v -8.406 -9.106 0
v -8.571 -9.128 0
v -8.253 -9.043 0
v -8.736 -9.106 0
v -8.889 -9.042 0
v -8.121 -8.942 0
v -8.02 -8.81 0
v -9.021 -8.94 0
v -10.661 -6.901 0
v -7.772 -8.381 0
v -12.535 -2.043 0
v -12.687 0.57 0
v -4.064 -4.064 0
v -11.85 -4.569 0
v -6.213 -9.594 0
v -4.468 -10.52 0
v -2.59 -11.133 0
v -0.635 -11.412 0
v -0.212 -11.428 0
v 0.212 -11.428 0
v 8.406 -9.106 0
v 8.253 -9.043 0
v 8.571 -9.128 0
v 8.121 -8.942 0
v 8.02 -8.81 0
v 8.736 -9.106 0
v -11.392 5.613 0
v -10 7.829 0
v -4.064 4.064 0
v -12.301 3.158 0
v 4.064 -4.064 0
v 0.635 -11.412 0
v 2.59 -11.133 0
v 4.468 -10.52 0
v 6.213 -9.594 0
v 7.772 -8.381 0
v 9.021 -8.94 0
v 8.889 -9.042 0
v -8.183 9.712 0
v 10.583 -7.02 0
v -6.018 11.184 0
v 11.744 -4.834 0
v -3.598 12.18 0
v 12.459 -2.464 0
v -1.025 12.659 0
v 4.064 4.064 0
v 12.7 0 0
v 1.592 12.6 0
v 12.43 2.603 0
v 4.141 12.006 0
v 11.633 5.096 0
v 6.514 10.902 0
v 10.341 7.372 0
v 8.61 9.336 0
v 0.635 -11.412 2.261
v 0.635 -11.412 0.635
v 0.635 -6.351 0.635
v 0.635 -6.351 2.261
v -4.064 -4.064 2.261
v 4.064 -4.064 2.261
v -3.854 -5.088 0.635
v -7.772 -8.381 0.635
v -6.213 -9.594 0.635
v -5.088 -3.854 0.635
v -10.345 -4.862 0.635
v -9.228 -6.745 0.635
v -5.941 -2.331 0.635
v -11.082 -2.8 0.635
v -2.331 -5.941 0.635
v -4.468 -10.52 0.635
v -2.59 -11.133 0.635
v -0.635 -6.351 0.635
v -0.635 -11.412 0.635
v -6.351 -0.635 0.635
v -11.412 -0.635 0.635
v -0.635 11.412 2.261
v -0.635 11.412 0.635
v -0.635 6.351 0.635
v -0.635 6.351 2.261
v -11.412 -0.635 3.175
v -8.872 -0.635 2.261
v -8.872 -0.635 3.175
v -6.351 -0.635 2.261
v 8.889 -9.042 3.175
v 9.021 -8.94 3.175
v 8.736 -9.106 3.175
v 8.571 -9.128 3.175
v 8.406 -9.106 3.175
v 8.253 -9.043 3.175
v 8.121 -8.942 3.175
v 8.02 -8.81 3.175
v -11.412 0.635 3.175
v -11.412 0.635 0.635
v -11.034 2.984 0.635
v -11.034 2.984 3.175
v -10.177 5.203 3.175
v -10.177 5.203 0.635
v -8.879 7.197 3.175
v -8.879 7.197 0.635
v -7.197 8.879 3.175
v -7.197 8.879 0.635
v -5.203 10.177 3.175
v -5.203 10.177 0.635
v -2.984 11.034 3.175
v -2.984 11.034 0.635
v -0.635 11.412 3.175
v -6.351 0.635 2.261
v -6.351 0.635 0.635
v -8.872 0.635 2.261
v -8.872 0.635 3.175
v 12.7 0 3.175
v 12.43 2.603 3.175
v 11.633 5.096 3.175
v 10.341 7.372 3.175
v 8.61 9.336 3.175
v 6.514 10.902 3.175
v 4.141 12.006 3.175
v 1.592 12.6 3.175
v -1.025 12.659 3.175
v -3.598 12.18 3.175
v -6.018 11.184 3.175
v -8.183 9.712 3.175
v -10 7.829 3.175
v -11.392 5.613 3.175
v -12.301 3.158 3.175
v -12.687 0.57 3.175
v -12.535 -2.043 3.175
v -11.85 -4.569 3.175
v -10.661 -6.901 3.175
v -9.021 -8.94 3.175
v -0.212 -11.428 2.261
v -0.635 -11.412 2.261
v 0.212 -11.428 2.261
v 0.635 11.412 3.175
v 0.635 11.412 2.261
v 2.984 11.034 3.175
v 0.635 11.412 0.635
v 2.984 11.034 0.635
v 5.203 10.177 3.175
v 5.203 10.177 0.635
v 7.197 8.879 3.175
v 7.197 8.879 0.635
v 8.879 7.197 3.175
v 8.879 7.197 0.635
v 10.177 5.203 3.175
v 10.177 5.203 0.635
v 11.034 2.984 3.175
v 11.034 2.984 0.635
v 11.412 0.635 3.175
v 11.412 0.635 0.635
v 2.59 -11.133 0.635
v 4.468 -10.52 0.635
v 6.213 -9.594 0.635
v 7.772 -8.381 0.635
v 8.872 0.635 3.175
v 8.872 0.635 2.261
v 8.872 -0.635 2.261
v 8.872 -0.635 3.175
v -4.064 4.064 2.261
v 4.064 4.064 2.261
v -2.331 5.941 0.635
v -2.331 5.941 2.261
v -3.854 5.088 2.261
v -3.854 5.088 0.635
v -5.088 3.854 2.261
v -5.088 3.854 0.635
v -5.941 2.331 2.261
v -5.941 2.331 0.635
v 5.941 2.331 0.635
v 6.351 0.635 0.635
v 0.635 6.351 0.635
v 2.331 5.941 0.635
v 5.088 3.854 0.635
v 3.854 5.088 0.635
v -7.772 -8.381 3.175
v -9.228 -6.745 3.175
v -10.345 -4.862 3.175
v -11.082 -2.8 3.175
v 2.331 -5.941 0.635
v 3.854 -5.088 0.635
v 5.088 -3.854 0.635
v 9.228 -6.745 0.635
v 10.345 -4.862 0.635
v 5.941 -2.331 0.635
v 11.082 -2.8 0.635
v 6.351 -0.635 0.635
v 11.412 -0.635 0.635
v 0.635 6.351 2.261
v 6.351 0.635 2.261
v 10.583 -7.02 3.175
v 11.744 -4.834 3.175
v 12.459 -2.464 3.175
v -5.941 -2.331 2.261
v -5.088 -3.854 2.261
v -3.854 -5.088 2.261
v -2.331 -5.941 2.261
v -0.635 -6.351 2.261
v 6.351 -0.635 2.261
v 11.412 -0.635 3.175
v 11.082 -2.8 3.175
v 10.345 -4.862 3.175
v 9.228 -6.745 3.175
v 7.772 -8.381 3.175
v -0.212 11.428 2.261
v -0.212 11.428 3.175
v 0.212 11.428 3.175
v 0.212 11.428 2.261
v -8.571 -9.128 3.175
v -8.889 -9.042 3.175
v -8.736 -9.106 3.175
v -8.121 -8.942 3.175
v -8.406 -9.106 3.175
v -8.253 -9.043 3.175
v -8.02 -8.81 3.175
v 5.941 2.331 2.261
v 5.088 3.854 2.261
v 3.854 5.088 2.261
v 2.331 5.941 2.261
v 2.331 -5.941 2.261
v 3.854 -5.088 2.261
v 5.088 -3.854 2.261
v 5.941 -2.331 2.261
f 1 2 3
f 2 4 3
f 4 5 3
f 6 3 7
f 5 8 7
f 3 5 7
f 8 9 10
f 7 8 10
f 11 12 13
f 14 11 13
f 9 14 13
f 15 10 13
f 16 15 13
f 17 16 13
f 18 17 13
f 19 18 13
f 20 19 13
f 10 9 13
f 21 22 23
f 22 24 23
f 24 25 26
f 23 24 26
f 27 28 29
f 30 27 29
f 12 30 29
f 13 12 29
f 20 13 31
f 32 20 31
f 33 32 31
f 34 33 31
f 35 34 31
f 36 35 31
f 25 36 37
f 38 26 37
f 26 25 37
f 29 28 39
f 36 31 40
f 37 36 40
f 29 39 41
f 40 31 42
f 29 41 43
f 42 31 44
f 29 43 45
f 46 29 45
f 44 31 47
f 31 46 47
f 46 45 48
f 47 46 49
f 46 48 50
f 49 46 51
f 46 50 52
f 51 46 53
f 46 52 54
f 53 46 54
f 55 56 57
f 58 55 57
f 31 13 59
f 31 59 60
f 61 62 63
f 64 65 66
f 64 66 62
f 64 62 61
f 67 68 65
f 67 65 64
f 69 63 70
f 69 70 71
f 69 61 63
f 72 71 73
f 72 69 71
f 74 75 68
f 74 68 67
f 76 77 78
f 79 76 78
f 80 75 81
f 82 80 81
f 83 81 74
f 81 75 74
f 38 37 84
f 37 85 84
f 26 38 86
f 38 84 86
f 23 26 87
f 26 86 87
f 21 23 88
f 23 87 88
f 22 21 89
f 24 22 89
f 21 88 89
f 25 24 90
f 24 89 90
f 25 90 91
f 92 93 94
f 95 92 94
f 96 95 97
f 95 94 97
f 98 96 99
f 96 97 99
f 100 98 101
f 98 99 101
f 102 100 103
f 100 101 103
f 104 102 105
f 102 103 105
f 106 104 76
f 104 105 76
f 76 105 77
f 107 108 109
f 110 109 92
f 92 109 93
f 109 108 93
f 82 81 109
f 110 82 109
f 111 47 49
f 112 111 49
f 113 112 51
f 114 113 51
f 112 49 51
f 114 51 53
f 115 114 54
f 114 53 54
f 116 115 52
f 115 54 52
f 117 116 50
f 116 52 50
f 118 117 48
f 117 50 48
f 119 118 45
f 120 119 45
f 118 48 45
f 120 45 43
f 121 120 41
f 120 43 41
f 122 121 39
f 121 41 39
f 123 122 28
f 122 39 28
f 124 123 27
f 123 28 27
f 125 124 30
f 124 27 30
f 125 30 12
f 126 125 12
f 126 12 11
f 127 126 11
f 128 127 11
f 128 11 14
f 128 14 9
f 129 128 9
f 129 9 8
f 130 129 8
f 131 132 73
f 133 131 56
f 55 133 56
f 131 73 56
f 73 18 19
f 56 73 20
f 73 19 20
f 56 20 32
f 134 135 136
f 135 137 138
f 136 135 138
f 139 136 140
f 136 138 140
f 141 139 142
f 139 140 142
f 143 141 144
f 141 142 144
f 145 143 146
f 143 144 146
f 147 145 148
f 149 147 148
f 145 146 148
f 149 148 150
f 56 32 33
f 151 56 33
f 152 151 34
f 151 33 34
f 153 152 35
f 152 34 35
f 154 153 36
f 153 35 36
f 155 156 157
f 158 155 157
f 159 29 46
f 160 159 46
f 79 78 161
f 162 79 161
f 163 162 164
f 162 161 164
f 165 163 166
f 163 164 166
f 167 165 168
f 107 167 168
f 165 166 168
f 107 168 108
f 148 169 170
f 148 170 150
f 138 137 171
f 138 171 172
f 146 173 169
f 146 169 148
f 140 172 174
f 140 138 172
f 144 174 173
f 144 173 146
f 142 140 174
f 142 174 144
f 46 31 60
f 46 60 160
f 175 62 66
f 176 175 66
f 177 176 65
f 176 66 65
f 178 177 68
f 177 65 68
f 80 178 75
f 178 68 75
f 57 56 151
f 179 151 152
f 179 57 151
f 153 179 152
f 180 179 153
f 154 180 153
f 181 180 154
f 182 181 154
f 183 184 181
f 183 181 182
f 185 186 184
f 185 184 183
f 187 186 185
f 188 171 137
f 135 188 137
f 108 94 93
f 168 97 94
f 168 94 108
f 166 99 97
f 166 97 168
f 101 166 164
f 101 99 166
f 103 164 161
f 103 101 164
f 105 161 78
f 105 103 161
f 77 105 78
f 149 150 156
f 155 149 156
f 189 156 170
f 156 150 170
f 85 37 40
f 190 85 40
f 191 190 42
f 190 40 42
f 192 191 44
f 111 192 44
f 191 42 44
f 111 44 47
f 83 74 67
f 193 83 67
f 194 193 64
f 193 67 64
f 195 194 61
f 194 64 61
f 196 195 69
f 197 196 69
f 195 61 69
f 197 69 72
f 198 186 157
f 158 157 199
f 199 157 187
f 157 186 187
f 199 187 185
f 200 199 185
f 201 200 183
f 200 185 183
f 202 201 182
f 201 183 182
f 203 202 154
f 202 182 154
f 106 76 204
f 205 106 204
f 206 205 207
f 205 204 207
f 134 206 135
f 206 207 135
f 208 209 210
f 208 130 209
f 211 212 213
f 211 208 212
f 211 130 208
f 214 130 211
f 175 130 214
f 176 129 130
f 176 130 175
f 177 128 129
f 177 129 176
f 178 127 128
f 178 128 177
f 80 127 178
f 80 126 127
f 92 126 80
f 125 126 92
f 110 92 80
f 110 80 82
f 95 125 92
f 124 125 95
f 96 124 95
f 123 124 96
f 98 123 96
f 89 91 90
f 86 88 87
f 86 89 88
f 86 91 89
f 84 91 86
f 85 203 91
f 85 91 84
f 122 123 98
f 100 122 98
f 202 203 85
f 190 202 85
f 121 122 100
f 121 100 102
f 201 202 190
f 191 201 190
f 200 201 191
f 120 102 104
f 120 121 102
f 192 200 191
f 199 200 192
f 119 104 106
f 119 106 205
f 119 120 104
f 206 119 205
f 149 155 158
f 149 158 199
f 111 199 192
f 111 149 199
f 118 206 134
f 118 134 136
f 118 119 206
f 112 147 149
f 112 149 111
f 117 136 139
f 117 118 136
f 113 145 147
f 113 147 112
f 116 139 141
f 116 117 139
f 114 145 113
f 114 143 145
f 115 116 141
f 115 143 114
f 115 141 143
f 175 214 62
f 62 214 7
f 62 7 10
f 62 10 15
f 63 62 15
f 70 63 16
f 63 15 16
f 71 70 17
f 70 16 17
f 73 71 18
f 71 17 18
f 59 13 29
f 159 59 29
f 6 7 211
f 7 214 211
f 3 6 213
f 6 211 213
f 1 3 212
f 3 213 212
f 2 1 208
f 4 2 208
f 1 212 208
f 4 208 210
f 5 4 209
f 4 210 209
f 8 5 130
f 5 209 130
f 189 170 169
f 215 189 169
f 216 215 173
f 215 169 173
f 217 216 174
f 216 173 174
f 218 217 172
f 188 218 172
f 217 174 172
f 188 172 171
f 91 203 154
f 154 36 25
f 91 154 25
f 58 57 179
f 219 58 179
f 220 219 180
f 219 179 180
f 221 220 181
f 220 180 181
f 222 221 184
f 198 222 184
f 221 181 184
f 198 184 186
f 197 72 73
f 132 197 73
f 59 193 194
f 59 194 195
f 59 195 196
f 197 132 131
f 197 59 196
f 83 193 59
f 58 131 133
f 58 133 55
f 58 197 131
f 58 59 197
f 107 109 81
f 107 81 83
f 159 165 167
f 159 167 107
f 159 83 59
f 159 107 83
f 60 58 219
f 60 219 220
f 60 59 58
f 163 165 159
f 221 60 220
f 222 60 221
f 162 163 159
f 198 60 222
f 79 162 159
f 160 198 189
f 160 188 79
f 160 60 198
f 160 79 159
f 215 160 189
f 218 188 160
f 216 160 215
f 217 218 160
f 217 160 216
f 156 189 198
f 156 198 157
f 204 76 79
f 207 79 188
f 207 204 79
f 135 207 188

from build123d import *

# Parameters (mm, degrees)
F0_W     = 8.128
F0_H     = 8.128
F1_DEPTH = 2.2606
F2_DEPTH = 0.635
F3_DEPTH = 3.175
F4_R     = 0.635


with BuildPart() as f1:
    # F0 (on Top) → F1 (new body)
    with BuildSketch(Plane.XY):
        with BuildLine():
            ThreePointArc((-6.3506963536, -0.635), (-4.5130128061, -4.5130128061), (-0.635, -6.3506963536))
            ThreePointArc((-0.635, -6.3506963536), (0, -6.3823639175), (0.635, -6.3506963536))
            ThreePointArc((0.635, -6.3506963536), (4.5130128061, -4.5130128061), (6.3506963536, -0.635))
            ThreePointArc((6.3506963536, -0.635), (6.3744421102, -0.3178945716), (6.3823639175, 0))
            ThreePointArc((6.3823639175, 0), (6.3744421102, 0.3178945716), (6.3506963536, 0.635))
            ThreePointArc((6.3506963536, 0.635), (4.5130128061, 4.5130128061), (0.635, 6.3506963536))
            ThreePointArc((0.635, 6.3506963536), (0, 6.3823639175), (-0.635, 6.3506963536))
            ThreePointArc((-0.635, 6.3506963536), (-4.5130128061, 4.5130128061), (-6.3506963536, 0.635))
            ThreePointArc((-6.3506963536, 0.635), (-6.3823639175, 0), (-6.3506963536, -0.635))
        make_face()
        Rectangle(F0_W, F0_H, mode=Mode.SUBTRACT)
        with BuildLine():
            Line((-0.635, -6.3506963536), (-0.635, -11.4123474798))
            ThreePointArc((-0.635, -11.4123474798), (0, -11.43), (0.635, -11.4123474798))
            Line((0.635, -11.4123474798), (0.635, -6.3506963536))
            ThreePointArc((0.635, -6.3506963536), (0, -6.3823639175), (-0.635, -6.3506963536))
        make_face()
        with BuildLine():
            ThreePointArc((0.635, 11.4123474798), (0, 11.43), (-0.635, 11.4123474798))
            Line((-0.635, 11.4123474798), (-0.635, 6.3506963536))
            ThreePointArc((-0.635, 6.3506963536), (0, 6.3823639175), (0.635, 6.3506963536))
            Line((0.635, 6.3506963536), (0.635, 11.4123474798))
        make_face()
        with BuildLine():
            Line((-8.8723474798, 0.635), (-8.8723474798, -0.635))
            Line((-8.8723474798, -0.635), (-6.3506963536, -0.635))
            ThreePointArc((-6.3506963536, -0.635), (-6.3823639175, 0), (-6.3506963536, 0.635))
            Line((-6.3506963536, 0.635), (-8.8723474798, 0.635))
        make_face()
        with BuildLine():
            Line((6.3506963536, -0.635), (8.8723474798, -0.635))
            Line((8.8723474798, -0.635), (8.8723474798, 0.635))
            Line((8.8723474798, 0.635), (6.3506963536, 0.635))
            ThreePointArc((6.3506963536, 0.635), (6.3744421102, 0.3178945716), (6.3823639175, 0))
            ThreePointArc((6.3823639175, 0), (6.3744421102, -0.3178945716), (6.3506963536, -0.635))
        make_face()
    extrude(amount=F1_DEPTH)

    # F0 (on Top) → F2 (join)
    with BuildSketch(Plane.XY):
        with BuildLine():
            ThreePointArc((-0.635, 11.4123474798), (-8.082230509, 8.082230509), (-11.4123474798, 0.635))
            Line((-11.4123474798, 0.635), (-8.8723474798, 0.635))
            Line((-8.8723474798, 0.635), (-6.3506963536, 0.635))
            ThreePointArc((-6.3506963536, 0.635), (-4.5130128061, 4.5130128061), (-0.635, 6.3506963536))
            Line((-0.635, 6.3506963536), (-0.635, 11.4123474798))
        make_face()
        with BuildLine():
            Line((8.8723474798, 0.635), (11.4123474798, 0.635))
            ThreePointArc((11.4123474798, 0.635), (8.082230509, 8.082230509), (0.635, 11.4123474798))
            Line((0.635, 11.4123474798), (0.635, 6.3506963536))
            ThreePointArc((0.635, 6.3506963536), (4.5130128061, 4.5130128061), (6.3506963536, 0.635))
            Line((6.3506963536, 0.635), (8.8723474798, 0.635))
        make_face()
        with BuildLine():
            ThreePointArc((0.635, -11.4123474798), (4.4682903074, -10.5204221269), (7.7718069116, -8.3811644375))
            ThreePointArc((7.7718069116, -8.3811644375), (10.3445014767, -4.8617064081), (11.4123474798, -0.635))
            Line((11.4123474798, -0.635), (8.8723474798, -0.635))
            Line((8.8723474798, -0.635), (6.3506963536, -0.635))
            ThreePointArc((6.3506963536, -0.635), (4.5130128061, -4.5130128061), (0.635, -6.3506963536))
            Line((0.635, -6.3506963536), (0.635, -11.4123474798))
        make_face()
        with BuildLine():
            ThreePointArc((-11.4123474798, -0.635), (-10.3445014767, -4.8617064081), (-7.7718069116, -8.3811644375))
            ThreePointArc((-7.7718069116, -8.3811644375), (-4.4682903074, -10.5204221269), (-0.635, -11.4123474798))
            Line((-0.635, -11.4123474798), (-0.635, -6.3506963536))
            ThreePointArc((-0.635, -6.3506963536), (-4.5130128061, -4.5130128061), (-6.3506963536, -0.635))
            Line((-6.3506963536, -0.635), (-8.8723474798, -0.635))
            Line((-8.8723474798, -0.635), (-11.4123474798, -0.635))
        make_face()
    extrude(amount=F2_DEPTH)

    # F0 (on Top) → F3 (join)
    with BuildSketch(Plane.XY):
        with BuildLine():
            ThreePointArc((-11.4123474798, 0.635), (-11.43, 0), (-11.4123474798, -0.635))
            Line((-11.4123474798, -0.635), (-8.8723474798, -0.635))
            Line((-8.8723474798, -0.635), (-8.8723474798, 0.635))
            Line((-8.8723474798, 0.635), (-11.4123474798, 0.635))
        make_face()
        with BuildLine():
            Line((8.8723474798, -0.635), (11.4123474798, -0.635))
            ThreePointArc((11.4123474798, -0.635), (11.4255860177, -0.317622658), (11.43, 0))
            ThreePointArc((11.43, 0), (11.4255860177, 0.317622658), (11.4123474798, 0.635))
            Line((11.4123474798, 0.635), (8.8723474798, 0.635))
            Line((8.8723474798, 0.635), (8.8723474798, -0.635))
        make_face()
        with BuildLine():
            ThreePointArc((8.4214084723, -9.5063073453), (11.581059701, -5.2123944786), (12.7, 0))
            ThreePointArc((12.7, 0), (-5.2123944786, 11.581059701), (-8.4214084723, -9.5063073453))
            Line((-8.4214084723, -9.5063073453), (-7.7718069116, -8.3811644375))
            ThreePointArc((-7.7718069116, -8.3811644375), (-10.3445014767, -4.8617064081), (-11.4123474798, -0.635))
            ThreePointArc((-11.4123474798, -0.635), (-11.43, 0), (-11.4123474798, 0.635))
            ThreePointArc((-11.4123474798, 0.635), (-8.082230509, 8.082230509), (-0.635, 11.4123474798))
            ThreePointArc((-0.635, 11.4123474798), (0, 11.43), (0.635, 11.4123474798))
            ThreePointArc((0.635, 11.4123474798), (8.082230509, 8.082230509), (11.4123474798, 0.635))
            ThreePointArc((11.4123474798, 0.635), (11.4255860177, 0.317622658), (11.43, 0))
            ThreePointArc((11.43, 0), (11.4255860177, -0.317622658), (11.4123474798, -0.635))
            ThreePointArc((11.4123474798, -0.635), (10.3445014767, -4.8617064081), (7.7718069116, -8.3811644375))
            Line((7.7718069116, -8.3811644375), (8.4214084723, -9.5063073453))
        make_face()
    extrude(amount=F3_DEPTH)

    # F4
    f4_edges = [f1.edges().sort_by_distance(p)[0] for p in [
        (-8.421408, -9.506307, 1.5875),
        (8.421408, -9.506307, 1.5875),
    ]]
    fillet(f4_edges, radius=F4_R)


solid = f1.part
